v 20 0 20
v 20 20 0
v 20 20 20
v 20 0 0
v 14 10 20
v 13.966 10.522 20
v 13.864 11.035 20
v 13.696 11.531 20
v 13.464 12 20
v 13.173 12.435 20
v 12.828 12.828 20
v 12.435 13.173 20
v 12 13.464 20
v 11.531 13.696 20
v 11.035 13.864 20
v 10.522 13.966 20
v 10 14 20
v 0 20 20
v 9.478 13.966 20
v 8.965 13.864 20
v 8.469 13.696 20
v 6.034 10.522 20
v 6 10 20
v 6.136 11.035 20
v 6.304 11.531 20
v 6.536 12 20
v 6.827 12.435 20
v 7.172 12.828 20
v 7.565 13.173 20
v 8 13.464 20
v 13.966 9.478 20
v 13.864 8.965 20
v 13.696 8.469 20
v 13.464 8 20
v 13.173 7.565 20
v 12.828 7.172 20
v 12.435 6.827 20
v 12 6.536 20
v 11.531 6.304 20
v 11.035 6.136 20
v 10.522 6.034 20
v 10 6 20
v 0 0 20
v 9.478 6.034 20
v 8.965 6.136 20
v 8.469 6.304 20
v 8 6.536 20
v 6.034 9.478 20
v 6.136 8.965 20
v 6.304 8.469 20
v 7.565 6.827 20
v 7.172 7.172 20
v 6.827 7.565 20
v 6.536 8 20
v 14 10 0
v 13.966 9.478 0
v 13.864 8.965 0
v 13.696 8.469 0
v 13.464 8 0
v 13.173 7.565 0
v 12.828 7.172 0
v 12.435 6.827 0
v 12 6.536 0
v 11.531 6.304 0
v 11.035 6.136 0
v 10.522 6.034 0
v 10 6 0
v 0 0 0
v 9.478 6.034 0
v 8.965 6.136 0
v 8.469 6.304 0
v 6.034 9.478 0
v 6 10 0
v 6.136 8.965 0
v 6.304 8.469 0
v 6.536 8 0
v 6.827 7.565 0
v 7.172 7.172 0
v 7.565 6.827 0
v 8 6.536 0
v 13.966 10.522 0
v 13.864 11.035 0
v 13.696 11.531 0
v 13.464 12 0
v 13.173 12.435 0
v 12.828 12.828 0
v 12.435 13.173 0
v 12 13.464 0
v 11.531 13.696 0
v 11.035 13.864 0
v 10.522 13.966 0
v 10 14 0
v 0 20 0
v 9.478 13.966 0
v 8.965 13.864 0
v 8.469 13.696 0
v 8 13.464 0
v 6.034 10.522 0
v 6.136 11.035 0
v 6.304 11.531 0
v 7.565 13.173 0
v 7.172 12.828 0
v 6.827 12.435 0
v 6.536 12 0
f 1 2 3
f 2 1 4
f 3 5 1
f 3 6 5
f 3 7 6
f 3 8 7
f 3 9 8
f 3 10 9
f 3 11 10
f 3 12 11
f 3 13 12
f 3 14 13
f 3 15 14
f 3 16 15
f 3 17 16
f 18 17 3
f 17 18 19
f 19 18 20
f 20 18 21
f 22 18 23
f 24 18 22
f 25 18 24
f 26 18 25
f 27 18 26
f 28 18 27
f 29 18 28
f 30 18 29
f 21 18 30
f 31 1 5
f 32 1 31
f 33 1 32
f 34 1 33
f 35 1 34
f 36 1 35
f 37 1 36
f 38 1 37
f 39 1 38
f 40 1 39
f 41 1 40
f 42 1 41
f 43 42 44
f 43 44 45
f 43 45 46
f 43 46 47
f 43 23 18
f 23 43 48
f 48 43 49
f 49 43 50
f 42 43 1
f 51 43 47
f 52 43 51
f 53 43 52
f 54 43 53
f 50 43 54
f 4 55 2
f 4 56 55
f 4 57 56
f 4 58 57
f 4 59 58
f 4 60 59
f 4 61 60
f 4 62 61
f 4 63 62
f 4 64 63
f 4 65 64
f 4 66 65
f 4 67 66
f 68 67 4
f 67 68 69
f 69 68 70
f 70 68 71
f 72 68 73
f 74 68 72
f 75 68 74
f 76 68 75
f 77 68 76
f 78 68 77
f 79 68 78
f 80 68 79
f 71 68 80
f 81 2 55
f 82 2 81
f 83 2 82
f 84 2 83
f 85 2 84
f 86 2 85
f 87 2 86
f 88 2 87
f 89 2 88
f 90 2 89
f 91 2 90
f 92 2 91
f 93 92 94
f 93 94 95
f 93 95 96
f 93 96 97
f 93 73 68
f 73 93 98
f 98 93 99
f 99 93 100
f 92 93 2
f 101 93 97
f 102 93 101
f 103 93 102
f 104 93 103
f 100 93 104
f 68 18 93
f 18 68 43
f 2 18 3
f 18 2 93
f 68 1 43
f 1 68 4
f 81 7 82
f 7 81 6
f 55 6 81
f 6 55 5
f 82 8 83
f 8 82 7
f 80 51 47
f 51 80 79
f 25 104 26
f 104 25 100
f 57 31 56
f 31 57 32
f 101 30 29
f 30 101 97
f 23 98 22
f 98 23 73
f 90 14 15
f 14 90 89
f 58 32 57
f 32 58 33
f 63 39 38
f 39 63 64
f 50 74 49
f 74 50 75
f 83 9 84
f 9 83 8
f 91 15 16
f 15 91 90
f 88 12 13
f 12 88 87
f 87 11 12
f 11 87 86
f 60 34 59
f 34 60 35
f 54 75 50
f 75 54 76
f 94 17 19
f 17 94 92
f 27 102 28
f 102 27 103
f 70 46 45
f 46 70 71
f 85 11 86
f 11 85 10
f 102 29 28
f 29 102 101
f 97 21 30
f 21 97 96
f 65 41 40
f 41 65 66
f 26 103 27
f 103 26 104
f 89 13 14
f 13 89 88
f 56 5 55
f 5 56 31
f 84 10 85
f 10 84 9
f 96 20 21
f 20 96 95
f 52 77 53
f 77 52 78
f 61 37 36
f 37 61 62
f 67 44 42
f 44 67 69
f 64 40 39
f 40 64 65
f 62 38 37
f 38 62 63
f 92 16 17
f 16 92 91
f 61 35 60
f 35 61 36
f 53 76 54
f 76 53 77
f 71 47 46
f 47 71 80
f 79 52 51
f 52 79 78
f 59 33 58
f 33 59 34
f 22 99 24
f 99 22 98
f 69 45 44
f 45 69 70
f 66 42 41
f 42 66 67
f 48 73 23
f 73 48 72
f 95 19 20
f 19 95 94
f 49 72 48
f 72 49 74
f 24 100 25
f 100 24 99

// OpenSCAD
size = 20;
$fn = 48;
difference() {
  cube(size, center = false);
  translate([size/2, size/2, -1]) cylinder(d = 8, h = size + 2);
}
